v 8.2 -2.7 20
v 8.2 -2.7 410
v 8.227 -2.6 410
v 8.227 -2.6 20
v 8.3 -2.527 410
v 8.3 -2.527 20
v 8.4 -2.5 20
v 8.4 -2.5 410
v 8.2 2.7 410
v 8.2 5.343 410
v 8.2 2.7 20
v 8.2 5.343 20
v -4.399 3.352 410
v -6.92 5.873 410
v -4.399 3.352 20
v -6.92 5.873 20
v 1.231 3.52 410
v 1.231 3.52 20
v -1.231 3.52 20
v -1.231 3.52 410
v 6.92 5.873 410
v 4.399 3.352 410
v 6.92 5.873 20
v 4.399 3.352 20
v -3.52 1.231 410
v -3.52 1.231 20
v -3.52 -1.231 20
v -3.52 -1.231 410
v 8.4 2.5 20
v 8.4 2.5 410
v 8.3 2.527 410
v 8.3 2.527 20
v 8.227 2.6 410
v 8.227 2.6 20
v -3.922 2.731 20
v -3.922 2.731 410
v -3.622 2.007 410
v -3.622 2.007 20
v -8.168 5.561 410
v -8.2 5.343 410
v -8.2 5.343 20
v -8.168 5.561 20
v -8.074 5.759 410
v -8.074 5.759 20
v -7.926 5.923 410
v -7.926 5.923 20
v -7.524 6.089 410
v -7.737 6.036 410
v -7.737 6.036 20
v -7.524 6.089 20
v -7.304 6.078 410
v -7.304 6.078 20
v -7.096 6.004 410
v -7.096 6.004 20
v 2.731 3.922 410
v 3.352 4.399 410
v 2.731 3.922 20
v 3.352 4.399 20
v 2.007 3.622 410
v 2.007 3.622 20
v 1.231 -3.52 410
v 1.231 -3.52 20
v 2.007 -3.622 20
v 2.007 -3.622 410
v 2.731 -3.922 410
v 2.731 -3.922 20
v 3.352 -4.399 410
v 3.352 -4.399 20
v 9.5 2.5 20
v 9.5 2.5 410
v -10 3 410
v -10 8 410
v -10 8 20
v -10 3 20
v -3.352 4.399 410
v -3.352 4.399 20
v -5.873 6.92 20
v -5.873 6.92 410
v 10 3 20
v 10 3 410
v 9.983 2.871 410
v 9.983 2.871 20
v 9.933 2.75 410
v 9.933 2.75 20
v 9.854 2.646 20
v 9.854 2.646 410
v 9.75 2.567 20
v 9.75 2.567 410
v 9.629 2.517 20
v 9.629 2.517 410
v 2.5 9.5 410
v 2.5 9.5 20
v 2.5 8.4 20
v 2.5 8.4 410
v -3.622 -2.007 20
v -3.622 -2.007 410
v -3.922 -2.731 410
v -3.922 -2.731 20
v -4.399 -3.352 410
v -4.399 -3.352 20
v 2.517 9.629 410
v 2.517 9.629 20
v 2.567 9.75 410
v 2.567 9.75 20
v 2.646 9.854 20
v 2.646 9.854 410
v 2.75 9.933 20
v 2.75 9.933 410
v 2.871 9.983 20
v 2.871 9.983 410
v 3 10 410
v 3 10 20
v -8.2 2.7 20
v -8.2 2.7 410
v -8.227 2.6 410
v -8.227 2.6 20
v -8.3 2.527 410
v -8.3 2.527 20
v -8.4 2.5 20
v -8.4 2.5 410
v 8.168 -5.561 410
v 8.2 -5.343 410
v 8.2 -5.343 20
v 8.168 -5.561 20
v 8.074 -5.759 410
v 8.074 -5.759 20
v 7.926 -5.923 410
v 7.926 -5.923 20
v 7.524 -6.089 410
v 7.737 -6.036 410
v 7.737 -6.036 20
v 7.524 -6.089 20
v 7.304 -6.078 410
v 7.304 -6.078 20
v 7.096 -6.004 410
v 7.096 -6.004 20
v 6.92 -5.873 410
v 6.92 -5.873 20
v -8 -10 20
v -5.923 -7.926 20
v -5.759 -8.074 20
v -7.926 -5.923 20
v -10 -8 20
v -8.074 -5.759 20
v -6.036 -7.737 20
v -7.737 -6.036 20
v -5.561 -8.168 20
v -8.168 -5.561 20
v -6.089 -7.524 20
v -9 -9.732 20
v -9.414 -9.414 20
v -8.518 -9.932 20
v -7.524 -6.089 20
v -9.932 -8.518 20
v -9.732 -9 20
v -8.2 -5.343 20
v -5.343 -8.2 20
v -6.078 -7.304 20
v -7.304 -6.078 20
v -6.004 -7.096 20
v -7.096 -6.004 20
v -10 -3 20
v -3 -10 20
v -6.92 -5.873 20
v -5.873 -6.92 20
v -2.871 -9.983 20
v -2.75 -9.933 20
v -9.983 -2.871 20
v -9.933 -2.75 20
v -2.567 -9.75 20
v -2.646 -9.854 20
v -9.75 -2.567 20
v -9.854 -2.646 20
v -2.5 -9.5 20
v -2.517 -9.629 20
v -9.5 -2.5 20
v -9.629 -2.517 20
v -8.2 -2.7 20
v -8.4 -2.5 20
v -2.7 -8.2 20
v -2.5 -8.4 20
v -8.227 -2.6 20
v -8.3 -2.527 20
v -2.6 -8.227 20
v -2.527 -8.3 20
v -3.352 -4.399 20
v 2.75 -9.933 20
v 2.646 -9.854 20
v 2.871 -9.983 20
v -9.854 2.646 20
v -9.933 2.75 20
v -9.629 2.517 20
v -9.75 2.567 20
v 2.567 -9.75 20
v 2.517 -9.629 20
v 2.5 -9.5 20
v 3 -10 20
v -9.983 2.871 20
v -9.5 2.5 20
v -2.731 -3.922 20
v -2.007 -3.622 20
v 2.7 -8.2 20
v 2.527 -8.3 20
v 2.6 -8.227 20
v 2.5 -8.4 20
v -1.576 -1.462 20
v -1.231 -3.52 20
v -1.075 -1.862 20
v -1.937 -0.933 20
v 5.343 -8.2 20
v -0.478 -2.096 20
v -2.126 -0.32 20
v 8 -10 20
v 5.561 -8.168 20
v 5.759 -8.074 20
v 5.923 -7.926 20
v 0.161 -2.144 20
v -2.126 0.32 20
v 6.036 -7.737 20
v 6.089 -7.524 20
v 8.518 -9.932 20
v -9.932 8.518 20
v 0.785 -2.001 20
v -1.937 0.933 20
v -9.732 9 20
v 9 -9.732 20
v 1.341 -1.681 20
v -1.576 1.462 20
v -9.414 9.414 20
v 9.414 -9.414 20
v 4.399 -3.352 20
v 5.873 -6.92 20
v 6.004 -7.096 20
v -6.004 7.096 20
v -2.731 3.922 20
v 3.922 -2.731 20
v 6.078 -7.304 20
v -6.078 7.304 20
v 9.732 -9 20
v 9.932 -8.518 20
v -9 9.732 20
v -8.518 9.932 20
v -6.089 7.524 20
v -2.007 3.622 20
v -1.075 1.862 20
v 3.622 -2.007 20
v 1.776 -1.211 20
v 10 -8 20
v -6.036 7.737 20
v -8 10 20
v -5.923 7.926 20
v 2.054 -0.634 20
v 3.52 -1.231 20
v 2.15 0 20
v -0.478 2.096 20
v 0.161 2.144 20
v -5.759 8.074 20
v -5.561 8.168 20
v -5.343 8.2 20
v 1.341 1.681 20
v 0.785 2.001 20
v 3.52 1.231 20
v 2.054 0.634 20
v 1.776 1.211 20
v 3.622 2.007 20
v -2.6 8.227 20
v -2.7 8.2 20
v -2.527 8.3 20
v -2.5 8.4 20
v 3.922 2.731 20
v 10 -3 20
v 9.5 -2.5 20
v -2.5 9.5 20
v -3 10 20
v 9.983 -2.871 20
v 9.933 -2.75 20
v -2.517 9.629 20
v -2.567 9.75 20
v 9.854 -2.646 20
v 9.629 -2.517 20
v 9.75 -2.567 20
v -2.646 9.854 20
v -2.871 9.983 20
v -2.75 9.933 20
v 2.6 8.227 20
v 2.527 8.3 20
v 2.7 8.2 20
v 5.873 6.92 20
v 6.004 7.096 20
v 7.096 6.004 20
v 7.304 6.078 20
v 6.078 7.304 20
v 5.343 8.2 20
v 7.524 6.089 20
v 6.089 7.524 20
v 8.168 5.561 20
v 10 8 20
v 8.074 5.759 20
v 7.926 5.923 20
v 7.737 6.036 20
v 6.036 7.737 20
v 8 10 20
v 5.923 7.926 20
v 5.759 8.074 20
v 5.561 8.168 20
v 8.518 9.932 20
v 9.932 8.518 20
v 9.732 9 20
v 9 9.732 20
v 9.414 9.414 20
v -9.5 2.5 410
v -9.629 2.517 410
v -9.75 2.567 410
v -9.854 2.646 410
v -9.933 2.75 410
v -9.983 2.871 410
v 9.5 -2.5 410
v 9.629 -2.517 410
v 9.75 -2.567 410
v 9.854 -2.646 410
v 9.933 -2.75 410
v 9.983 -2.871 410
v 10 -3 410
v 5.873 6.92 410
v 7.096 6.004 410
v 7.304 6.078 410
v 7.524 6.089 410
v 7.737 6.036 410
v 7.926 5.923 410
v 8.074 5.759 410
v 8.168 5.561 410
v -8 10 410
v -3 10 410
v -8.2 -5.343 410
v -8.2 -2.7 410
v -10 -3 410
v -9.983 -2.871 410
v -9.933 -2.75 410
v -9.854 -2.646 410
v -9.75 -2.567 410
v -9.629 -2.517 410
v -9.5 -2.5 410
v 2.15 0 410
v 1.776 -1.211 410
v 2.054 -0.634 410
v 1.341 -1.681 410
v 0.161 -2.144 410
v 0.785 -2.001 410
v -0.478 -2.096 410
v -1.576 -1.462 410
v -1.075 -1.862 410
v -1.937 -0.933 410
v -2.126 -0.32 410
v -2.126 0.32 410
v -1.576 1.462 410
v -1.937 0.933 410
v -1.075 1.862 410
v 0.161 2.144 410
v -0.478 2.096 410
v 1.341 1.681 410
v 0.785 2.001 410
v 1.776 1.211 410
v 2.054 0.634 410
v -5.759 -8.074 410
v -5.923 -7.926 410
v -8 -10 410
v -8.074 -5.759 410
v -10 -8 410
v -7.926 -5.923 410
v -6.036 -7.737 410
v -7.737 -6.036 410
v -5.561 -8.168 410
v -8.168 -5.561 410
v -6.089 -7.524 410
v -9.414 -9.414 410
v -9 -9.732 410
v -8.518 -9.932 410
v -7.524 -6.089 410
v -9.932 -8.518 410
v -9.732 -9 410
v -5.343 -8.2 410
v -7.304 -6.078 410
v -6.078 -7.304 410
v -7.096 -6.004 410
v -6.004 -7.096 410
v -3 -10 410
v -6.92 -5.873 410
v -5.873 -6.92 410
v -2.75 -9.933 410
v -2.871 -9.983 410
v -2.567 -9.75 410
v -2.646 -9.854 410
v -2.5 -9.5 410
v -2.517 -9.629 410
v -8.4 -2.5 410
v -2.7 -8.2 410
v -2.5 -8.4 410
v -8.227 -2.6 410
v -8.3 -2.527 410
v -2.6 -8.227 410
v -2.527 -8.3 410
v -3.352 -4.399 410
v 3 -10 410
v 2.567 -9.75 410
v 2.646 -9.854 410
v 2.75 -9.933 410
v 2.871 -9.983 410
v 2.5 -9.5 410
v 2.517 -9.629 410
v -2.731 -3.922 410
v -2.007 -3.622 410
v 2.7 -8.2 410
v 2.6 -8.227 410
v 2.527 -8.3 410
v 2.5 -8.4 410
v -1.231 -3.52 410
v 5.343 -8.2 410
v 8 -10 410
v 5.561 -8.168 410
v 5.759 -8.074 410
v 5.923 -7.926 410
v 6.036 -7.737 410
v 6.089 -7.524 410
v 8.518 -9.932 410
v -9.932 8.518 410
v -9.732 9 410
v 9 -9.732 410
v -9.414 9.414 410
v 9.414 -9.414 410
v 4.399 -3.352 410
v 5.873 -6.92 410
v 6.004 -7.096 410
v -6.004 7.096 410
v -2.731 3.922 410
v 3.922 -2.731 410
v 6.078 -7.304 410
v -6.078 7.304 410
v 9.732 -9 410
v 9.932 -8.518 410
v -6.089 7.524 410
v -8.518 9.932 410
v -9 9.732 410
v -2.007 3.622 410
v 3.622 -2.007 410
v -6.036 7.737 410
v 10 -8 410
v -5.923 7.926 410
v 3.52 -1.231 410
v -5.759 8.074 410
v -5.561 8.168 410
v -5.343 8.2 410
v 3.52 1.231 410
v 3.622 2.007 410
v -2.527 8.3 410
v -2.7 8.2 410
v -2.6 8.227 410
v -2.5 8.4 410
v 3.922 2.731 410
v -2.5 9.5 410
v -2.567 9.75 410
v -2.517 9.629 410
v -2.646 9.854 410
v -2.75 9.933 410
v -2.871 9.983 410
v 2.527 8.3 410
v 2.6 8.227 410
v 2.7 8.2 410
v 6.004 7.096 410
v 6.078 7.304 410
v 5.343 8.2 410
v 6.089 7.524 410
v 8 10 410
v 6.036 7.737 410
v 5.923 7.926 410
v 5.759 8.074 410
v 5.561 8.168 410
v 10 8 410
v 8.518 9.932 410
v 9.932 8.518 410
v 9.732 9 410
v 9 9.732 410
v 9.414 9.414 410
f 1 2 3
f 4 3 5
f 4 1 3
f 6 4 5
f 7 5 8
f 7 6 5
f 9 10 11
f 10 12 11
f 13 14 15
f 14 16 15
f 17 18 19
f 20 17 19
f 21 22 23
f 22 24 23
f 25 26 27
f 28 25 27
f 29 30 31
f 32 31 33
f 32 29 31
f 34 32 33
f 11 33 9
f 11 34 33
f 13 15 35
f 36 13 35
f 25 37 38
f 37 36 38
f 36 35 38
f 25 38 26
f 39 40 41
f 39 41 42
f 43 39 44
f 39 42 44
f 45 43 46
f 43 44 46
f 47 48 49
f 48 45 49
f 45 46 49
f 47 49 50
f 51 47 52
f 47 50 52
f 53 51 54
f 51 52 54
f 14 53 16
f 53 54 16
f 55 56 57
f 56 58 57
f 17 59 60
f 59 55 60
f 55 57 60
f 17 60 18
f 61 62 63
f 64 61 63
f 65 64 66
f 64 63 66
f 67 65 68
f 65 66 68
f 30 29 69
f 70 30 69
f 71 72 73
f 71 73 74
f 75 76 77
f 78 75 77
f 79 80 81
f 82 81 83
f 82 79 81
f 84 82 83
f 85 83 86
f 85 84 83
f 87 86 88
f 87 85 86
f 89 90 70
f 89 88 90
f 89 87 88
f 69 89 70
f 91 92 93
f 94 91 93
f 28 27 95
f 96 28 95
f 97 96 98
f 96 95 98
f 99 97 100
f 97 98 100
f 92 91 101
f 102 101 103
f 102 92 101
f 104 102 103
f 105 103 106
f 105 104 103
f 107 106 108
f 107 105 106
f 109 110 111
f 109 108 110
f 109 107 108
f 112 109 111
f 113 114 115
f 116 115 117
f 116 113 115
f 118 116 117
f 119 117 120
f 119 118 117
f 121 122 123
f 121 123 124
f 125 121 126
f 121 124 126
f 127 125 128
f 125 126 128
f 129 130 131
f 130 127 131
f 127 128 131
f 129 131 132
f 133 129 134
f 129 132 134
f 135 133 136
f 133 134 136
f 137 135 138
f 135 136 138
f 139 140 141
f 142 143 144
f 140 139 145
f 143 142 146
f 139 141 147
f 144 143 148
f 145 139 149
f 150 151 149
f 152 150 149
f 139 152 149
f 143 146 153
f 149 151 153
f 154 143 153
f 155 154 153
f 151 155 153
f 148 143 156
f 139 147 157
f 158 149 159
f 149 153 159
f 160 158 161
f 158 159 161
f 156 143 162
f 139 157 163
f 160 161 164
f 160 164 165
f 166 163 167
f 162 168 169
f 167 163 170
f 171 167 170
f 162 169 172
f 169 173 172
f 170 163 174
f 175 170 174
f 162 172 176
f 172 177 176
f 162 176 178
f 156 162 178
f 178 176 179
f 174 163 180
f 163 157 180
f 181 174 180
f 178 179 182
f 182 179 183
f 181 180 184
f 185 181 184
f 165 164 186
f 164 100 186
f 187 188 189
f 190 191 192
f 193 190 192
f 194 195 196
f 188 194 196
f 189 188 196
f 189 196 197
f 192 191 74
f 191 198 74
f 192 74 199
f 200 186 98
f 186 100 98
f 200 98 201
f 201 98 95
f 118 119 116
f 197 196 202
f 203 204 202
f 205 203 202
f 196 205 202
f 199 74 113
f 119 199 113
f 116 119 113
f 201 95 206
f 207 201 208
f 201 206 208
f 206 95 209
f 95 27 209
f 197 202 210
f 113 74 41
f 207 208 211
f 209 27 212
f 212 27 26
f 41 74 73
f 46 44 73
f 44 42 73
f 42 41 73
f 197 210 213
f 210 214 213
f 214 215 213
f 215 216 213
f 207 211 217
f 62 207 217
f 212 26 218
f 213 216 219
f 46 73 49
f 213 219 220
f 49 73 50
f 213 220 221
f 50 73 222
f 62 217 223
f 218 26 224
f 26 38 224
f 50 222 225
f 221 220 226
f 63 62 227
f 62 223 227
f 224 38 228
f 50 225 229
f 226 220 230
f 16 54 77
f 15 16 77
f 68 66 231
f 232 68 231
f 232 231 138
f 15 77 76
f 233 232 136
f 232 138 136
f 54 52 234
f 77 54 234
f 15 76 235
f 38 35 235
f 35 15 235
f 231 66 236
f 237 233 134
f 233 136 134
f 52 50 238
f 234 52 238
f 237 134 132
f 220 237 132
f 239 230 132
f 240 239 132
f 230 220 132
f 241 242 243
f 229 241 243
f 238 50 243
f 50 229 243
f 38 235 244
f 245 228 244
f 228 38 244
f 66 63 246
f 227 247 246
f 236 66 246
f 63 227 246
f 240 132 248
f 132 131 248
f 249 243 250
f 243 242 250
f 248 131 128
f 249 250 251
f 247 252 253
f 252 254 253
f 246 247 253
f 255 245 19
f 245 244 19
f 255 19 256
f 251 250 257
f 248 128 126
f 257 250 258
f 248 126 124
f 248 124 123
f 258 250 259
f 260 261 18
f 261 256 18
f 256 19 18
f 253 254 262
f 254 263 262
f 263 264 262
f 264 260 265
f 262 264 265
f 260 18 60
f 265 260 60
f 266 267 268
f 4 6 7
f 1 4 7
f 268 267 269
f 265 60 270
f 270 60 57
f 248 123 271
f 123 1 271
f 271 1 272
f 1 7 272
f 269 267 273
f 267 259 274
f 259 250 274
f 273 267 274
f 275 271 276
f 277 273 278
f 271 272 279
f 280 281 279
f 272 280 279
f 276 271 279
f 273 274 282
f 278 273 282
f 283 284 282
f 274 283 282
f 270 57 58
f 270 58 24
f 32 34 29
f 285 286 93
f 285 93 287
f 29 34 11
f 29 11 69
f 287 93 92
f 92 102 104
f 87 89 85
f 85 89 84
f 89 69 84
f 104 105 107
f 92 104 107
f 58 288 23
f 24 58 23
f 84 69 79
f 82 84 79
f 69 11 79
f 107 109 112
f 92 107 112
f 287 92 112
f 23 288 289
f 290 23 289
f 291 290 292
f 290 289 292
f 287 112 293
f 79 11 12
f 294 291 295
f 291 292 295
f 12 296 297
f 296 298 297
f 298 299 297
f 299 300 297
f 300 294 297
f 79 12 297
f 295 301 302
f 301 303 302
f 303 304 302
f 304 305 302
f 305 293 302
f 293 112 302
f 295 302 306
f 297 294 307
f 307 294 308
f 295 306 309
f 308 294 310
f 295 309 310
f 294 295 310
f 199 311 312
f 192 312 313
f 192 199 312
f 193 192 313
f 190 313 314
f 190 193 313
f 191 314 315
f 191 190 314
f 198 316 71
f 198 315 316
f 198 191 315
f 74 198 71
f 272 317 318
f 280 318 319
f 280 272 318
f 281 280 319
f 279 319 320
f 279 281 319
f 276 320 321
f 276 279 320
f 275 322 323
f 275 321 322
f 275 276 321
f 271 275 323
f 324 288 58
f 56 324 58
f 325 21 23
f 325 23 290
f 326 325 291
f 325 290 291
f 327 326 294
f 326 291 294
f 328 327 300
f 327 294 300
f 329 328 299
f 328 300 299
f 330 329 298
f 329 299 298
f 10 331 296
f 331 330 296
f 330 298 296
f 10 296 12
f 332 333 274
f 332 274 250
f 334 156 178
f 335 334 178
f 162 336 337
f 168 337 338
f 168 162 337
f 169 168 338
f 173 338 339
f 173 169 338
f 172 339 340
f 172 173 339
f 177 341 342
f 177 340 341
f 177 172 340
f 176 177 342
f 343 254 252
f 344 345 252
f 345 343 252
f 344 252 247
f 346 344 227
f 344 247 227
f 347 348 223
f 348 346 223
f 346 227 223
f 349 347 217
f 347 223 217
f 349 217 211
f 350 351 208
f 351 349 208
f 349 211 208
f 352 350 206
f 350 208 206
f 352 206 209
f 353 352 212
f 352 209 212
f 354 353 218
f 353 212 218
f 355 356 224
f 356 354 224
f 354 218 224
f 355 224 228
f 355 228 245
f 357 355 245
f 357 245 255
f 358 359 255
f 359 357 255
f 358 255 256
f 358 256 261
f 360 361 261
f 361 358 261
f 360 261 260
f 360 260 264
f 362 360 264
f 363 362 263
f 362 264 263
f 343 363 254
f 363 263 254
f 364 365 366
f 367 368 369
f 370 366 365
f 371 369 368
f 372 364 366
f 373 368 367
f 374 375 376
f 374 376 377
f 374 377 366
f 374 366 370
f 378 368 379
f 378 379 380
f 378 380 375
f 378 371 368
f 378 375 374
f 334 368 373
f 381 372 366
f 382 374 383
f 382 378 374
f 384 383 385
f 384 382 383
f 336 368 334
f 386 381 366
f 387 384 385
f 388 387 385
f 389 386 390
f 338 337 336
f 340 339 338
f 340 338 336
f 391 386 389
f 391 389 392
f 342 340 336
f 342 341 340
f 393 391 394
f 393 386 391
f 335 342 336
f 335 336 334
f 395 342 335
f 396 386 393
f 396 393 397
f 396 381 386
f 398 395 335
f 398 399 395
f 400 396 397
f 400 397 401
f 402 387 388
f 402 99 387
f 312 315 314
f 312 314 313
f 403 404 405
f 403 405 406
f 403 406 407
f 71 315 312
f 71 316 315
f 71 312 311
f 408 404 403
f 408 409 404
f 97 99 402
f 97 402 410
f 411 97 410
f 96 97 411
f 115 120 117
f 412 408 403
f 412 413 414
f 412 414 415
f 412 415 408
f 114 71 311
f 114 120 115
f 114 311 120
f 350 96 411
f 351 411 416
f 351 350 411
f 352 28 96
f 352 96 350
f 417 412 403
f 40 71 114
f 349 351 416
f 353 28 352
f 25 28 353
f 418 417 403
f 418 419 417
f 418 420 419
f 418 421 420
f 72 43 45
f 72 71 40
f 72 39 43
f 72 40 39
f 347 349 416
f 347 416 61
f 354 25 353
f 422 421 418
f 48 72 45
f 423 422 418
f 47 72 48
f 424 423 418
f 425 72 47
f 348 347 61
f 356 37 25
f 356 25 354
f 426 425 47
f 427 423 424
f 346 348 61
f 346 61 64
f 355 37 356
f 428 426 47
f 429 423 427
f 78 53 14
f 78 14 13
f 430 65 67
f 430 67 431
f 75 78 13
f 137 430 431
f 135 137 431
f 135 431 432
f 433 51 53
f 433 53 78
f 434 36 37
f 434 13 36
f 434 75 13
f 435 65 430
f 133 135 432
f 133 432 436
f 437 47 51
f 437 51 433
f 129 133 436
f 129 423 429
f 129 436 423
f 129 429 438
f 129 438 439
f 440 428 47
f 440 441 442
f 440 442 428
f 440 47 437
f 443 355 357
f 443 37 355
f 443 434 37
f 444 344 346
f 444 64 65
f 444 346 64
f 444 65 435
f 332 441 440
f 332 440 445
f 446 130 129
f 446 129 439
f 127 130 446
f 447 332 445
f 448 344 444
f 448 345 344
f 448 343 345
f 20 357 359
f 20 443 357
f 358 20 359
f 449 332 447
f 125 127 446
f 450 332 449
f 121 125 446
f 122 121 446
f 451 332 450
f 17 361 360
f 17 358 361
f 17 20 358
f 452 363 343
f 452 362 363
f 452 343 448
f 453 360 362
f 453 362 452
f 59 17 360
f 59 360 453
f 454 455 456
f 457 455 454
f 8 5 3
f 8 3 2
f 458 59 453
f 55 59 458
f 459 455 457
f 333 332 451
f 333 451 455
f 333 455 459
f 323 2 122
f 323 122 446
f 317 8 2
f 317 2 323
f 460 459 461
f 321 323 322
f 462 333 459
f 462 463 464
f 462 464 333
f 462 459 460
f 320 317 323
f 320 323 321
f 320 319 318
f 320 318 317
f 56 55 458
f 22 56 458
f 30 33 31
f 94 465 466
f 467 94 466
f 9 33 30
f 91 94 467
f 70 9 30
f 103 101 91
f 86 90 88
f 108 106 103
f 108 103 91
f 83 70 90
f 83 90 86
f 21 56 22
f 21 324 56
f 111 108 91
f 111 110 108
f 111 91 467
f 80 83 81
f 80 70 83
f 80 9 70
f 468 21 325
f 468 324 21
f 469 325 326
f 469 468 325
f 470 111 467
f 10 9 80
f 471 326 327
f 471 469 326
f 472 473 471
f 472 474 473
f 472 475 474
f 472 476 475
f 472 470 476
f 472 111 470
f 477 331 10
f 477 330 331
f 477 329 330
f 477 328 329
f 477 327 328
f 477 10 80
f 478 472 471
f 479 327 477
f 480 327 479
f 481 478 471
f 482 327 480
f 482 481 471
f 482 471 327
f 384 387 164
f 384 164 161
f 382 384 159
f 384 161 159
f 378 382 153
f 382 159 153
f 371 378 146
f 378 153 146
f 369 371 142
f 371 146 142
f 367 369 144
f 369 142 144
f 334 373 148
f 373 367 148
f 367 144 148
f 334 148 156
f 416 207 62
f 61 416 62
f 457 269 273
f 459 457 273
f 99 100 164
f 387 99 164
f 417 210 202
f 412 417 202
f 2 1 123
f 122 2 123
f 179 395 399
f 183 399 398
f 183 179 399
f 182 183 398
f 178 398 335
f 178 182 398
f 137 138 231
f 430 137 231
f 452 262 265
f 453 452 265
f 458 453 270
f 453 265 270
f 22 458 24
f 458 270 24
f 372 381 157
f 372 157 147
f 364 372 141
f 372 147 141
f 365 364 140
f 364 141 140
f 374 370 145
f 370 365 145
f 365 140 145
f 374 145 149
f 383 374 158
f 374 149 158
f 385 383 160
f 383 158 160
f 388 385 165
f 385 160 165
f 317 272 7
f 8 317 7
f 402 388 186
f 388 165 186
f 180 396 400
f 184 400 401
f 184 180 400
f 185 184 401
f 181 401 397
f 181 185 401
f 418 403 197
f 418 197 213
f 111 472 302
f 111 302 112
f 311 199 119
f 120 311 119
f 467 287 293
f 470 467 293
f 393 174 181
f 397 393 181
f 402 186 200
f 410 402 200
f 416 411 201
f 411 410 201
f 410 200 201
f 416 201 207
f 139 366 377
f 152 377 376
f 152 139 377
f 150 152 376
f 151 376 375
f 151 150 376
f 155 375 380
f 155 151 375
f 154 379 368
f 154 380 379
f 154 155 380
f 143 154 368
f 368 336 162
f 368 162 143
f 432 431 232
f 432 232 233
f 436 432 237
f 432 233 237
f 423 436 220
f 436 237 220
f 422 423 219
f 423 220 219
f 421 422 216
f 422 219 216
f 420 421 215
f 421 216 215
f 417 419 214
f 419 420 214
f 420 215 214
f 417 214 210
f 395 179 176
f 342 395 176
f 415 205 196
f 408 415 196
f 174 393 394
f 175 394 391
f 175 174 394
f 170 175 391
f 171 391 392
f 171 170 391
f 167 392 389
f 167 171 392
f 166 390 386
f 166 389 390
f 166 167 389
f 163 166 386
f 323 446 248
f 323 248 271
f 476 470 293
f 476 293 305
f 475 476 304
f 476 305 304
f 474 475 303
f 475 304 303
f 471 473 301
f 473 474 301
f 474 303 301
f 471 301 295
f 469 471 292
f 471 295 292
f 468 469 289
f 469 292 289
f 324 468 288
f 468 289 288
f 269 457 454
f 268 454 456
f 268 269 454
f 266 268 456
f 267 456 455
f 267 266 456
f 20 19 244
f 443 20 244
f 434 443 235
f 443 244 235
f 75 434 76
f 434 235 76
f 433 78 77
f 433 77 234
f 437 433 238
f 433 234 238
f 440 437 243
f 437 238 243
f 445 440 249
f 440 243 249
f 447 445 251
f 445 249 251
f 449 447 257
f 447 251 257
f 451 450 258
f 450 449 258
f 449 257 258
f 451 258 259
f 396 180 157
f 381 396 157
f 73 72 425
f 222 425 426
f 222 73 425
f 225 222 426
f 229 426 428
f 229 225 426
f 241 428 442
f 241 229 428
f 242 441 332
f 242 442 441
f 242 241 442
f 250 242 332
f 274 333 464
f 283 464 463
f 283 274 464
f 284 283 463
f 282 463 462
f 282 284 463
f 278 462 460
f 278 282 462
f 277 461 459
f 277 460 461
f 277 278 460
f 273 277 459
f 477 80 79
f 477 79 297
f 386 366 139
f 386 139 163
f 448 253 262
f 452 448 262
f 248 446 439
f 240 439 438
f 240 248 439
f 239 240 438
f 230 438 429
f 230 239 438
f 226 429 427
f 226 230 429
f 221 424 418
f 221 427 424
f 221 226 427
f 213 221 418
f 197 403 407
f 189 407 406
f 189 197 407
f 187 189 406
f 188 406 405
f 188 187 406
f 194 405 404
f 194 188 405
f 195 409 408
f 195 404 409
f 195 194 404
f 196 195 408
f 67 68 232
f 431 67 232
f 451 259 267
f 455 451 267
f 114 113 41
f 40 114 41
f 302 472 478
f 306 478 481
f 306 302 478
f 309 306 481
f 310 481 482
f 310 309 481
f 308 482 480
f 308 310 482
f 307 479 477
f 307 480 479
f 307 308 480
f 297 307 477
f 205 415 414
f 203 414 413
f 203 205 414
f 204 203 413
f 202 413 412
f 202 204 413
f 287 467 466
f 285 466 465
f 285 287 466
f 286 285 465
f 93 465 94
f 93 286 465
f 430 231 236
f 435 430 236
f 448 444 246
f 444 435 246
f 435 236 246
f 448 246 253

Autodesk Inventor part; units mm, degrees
ref_plane "Płaszczyzna początkowa" through (0, 0, 20) normal (0, 0, 1) x (1, 0, 0)
ref_plane "Płaszczyzna końcowa" through (0, 0, 410) normal (0, 0, 1) x (1, 0, 0)
sketch "Szkic" plane through (0, 0, 0) normal (0, 0, 1) x (1, 0, 0)
  arc A0 (8, -10) -> (10, -8) centre (8, -8) ccw
  line L0 (10, -8) -> (10, -3)
  arc A1 (10, -3) -> (9.5, -2.5) centre (9.5, -3) ccw
  line L1 (9.5, -2.5) -> (8.4, -2.5)
  arc A2 (8.4, -2.5) -> (8.2, -2.7) centre (8.4, -2.7) ccw
  line L2 (8.2, -2.7) -> (8.2, -5.3428)
  arc A3 (6.9197, -5.8732) -> (8.2, -5.3428) centre (7.45, -5.3428) ccw
  line L3 (6.9197, -5.8732) -> (4.3987, -3.3522)
  arc A4 (3.52, -1.2308) -> (4.3987, -3.3522) centre (6.52, -1.2308) ccw
  line L4 (3.52, -1.2308) -> (3.52, 1.2308)
  arc A5 (4.3987, 3.3522) -> (3.52, 1.2308) centre (6.52, 1.2308) ccw
  line L5 (4.3987, 3.3522) -> (6.9197, 5.8732)
  arc A6 (8.2, 5.3428) -> (6.9197, 5.8732) centre (7.45, 5.3428) ccw
  line L6 (8.2, 5.3428) -> (8.2, 2.7)
  arc A7 (8.2, 2.7) -> (8.4, 2.5) centre (8.4, 2.7) ccw
  line L7 (8.4, 2.5) -> (9.5, 2.5)
  arc A8 (9.5, 2.5) -> (10, 3) centre (9.5, 3) ccw
  line L8 (10, 3) -> (10, 8)
  arc A9 (10, 8) -> (8, 10) centre (8, 8) ccw
  line L9 (8, 10) -> (3, 10)
  arc A10 (3, 10) -> (2.5, 9.5) centre (3, 9.5) ccw
  line L10 (2.5, 9.5) -> (2.5, 8.4)
  arc A11 (2.5, 8.4) -> (2.7, 8.2) centre (2.7, 8.4) ccw
  line L11 (2.7, 8.2) -> (5.3428, 8.2)
  arc A12 (5.8732, 6.9197) -> (5.3428, 8.2) centre (5.3428, 7.45) ccw
  line L12 (5.8732, 6.9197) -> (3.3522, 4.3987)
  arc A13 (1.2308, 3.52) -> (3.3522, 4.3987) centre (1.2308, 6.52) ccw
  line L13 (1.2308, 3.52) -> (-1.2308, 3.52)
  arc A14 (-3.3522, 4.3987) -> (-1.2308, 3.52) centre (-1.2308, 6.52) ccw
  line L14 (-3.3522, 4.3987) -> (-5.8732, 6.9197)
  arc A15 (-5.3428, 8.2) -> (-5.8732, 6.9197) centre (-5.3428, 7.45) ccw
  line L15 (-5.3428, 8.2) -> (-2.7, 8.2)
  arc A16 (-2.7, 8.2) -> (-2.5, 8.4) centre (-2.7, 8.4) ccw
  line L16 (-2.5, 8.4) -> (-2.5, 9.5)
  arc A17 (-2.5, 9.5) -> (-3, 10) centre (-3, 9.5) ccw
  line L17 (-3, 10) -> (-8, 10)
  arc A18 (-8, 10) -> (-10, 8) centre (-8, 8) ccw
  line L18 (-10, 8) -> (-10, 3)
  arc A19 (-10, 3) -> (-9.5, 2.5) centre (-9.5, 3) ccw
  line L19 (-9.5, 2.5) -> (-8.4, 2.5)
  arc A20 (-8.4, 2.5) -> (-8.2, 2.7) centre (-8.4, 2.7) ccw
  line L20 (-8.2, 2.7) -> (-8.2, 5.3428)
  arc A21 (-6.9197, 5.8732) -> (-8.2, 5.3428) centre (-7.45, 5.3428) ccw
  line L21 (-6.9197, 5.8732) -> (-4.3987, 3.3522)
  arc A22 (-3.52, 1.2308) -> (-4.3987, 3.3522) centre (-6.52, 1.2308) ccw
  line L22 (-3.52, 1.2308) -> (-3.52, -1.2308)
  arc A23 (-4.3987, -3.3522) -> (-3.52, -1.2308) centre (-6.52, -1.2308) ccw
  line L23 (-4.3987, -3.3522) -> (-6.9197, -5.8732)
  arc A24 (-8.2, -5.3428) -> (-6.9197, -5.8732) centre (-7.45, -5.3428) ccw
  line L24 (-8.2, -5.3428) -> (-8.2, -2.7)
  arc A25 (-8.2, -2.7) -> (-8.4, -2.5) centre (-8.4, -2.7) ccw
  line L25 (-8.4, -2.5) -> (-9.5, -2.5)
  arc A26 (-9.5, -2.5) -> (-10, -3) centre (-9.5, -3) ccw
  line L26 (-10, -3) -> (-10, -8)
  arc A27 (-10, -8) -> (-8, -10) centre (-8, -8) ccw
  line L27 (-8, -10) -> (-3, -10)
  arc A28 (-3, -10) -> (-2.5, -9.5) centre (-3, -9.5) ccw
  line L28 (-2.5, -9.5) -> (-2.5, -8.4)
  arc A29 (-2.5, -8.4) -> (-2.7, -8.2) centre (-2.7, -8.4) ccw
  line L29 (-2.7, -8.2) -> (-5.3428, -8.2)
  arc A30 (-5.8732, -6.9197) -> (-5.3428, -8.2) centre (-5.3428, -7.45) ccw
  line L30 (-5.8732, -6.9197) -> (-3.3522, -4.3987)
  arc A31 (-1.2308, -3.52) -> (-3.3522, -4.3987) centre (-1.2308, -6.52) ccw
  line L31 (-1.2308, -3.52) -> (1.2308, -3.52)
  arc A32 (3.3522, -4.3987) -> (1.2308, -3.52) centre (1.2308, -6.52) ccw
  line L32 (3.3522, -4.3987) -> (5.8732, -6.9197)
  arc A33 (5.3428, -8.2) -> (5.8732, -6.9197) centre (5.3428, -7.45) ccw
  line L33 (5.3428, -8.2) -> (2.7, -8.2)
  arc A34 (2.7, -8.2) -> (2.5, -8.4) centre (2.7, -8.4) ccw
  line L34 (2.5, -8.4) -> (2.5, -9.5)
  arc A35 (2.5, -9.5) -> (3, -10) centre (3, -9.5) ccw
  line L35 (3, -10) -> (8, -10)
  circle A36 centre (0, 0) radius 2.15
  point P0 (10, -10)
extrude "Bryła" add sketch "Szkic" along normal up to surface (390 mm away) from surface at 20
sketch "Szkic4" plane through (0, 0, 0) normal (0, 0, 1) x (1, 0, 0)
  line L0 (0, 0) -> (10, 0)
ref_plane "Płaszczyzna konstrukcyjna4" through (0, 0, 0) normal (0, -1, 0) x (1, 0, 0)
sketch "Szkic5" plane through (0, 0, 0) normal (0, -1, 0) x (1, 0, 0)
  line L0 (-2, 20) -> (12, 20)
  line L1 (-2, 410) -> (12, 410)
  dimension "d7" = 390
ref_plane "Płaszczyzna konstrukcyjna5" through (3, 450, 410) normal (0, 0, 1) x (1, 0, 0)
split "Podział1" plane through (3, 450, 410) removes the side toward (0, 0, 1)
ref_plane "Płaszczyzna konstrukcyjna6" through (8, 440, 20) normal (0, 0, -1) x (-1, 0, 0)
split "Podział2" plane through (8, 440, 20) removes the side toward (0, 0, -1)
equation "\"G_L\" = d7"
properties part number "COTS_ARMA_AR3701_20x20_Alu_Extr_00000002" material "Aluminium 6061-AHC"
